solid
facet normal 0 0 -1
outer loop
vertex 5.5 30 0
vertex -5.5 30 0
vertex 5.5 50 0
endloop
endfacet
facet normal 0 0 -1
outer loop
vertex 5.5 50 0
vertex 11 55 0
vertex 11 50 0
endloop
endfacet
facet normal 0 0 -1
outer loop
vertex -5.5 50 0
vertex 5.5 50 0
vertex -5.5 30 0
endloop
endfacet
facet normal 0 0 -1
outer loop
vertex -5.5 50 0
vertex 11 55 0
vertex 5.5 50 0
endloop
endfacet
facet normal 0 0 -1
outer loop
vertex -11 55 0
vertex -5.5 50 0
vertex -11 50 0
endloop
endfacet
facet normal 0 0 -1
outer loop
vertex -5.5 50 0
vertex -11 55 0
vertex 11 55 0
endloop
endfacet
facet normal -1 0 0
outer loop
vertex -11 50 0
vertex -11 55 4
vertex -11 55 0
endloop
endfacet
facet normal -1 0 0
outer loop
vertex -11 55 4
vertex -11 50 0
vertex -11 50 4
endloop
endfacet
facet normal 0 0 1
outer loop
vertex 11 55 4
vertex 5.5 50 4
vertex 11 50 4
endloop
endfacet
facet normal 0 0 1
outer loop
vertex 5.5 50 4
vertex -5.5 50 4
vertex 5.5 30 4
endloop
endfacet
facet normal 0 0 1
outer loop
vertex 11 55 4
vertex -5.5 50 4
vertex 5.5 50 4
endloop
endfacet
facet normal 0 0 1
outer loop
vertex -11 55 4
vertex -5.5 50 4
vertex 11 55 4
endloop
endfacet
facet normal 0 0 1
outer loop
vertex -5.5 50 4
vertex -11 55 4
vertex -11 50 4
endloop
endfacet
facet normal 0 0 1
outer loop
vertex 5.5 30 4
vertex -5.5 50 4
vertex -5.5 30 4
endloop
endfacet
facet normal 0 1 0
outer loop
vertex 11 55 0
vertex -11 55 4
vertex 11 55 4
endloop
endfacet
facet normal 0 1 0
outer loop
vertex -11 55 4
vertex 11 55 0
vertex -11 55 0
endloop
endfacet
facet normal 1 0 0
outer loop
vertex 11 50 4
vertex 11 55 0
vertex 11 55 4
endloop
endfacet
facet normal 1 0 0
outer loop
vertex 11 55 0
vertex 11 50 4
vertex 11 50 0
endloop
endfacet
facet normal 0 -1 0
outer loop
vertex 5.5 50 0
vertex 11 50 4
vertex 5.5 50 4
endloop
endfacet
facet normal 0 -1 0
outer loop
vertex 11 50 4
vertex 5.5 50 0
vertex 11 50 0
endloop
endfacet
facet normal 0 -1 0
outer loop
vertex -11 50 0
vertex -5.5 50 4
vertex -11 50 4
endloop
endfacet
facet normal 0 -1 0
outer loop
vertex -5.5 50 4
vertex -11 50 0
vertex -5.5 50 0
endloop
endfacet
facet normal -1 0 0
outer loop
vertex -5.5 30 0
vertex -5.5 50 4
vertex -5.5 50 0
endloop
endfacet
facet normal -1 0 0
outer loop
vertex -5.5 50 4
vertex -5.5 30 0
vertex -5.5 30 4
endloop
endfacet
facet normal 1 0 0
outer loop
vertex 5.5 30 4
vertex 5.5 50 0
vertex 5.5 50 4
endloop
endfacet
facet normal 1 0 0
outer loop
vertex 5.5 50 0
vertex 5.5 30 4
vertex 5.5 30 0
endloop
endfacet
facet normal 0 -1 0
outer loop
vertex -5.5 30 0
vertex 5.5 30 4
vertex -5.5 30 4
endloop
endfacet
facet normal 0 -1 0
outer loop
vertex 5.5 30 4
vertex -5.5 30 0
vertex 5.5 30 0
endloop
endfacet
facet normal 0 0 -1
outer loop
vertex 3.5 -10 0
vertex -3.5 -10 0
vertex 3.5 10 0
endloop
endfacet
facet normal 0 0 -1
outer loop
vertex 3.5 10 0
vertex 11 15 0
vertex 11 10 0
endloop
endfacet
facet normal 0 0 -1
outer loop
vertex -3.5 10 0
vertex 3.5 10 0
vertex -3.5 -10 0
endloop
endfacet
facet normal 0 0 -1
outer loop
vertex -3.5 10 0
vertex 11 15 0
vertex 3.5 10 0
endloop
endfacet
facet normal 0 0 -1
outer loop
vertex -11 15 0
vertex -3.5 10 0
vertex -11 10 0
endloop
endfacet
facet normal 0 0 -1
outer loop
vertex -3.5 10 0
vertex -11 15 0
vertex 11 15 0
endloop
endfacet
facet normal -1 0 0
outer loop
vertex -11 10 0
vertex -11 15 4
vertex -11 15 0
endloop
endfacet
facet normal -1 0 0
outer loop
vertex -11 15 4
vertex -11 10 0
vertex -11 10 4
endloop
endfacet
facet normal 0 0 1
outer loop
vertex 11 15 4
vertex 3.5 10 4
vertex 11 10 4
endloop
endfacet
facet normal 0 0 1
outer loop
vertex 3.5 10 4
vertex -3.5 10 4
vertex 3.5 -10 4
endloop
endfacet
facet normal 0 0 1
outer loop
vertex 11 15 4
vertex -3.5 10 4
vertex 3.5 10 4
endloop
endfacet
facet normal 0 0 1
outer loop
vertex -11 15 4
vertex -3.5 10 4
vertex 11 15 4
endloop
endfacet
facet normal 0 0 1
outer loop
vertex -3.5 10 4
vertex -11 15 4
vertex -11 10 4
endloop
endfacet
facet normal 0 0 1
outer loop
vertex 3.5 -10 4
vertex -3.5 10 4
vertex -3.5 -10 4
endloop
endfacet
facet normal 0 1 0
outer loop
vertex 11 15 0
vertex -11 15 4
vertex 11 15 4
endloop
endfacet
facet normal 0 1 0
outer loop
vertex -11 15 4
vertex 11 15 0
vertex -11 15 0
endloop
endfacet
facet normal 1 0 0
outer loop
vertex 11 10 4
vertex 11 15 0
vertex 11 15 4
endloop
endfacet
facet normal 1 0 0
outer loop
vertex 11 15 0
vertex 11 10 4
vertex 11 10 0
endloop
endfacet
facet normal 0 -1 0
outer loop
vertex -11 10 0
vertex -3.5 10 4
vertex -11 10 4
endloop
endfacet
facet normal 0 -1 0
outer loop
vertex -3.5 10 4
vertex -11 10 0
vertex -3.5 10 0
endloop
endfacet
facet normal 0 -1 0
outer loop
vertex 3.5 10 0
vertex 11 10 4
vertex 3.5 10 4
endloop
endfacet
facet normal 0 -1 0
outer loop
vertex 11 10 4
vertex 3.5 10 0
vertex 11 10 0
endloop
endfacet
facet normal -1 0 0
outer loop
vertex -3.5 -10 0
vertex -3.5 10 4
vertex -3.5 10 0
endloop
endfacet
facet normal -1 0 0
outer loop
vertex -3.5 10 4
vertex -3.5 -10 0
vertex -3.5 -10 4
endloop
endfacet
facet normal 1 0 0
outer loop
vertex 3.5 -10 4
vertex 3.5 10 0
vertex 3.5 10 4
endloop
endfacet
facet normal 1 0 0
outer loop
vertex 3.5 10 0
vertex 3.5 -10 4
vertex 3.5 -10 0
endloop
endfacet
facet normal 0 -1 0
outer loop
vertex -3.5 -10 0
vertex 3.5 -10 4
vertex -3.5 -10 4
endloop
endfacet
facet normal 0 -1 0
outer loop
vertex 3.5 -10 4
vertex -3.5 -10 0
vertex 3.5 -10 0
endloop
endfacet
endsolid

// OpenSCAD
PAPER_THICKNESS = 2;

WIDTH1 = 4 * PAPER_THICKNESS - 1;
WIDTH2 = 6 * PAPER_THICKNESS - 1;
OVERHANG = 0;

LENGTH = 20;

translate([0, LENGTH/2+2.5])
linear_extrude(PAPER_THICKNESS*2)
square([WIDTH2*2, 5], center=true);

linear_extrude(PAPER_THICKNESS)
    square([WIDTH1, LENGTH], center=true);

translate([0, 0, PAPER_THICKNESS])
    linear_extrude(PAPER_THICKNESS)
    square([WIDTH1 + OVERHANG * 2, LENGTH], center=true);


translate([0, 2 * LENGTH, 0]){
	translate([0, LENGTH/2+2.5])
		linear_extrude(PAPER_THICKNESS*2)
		square([WIDTH2*2, 5], center=true);

	linear_extrude(PAPER_THICKNESS)
		square([WIDTH2, LENGTH], center=true);

	translate([0, 0, PAPER_THICKNESS])
		linear_extrude(PAPER_THICKNESS)
		square([WIDTH2 + OVERHANG * 2, LENGTH], center=true);
}
